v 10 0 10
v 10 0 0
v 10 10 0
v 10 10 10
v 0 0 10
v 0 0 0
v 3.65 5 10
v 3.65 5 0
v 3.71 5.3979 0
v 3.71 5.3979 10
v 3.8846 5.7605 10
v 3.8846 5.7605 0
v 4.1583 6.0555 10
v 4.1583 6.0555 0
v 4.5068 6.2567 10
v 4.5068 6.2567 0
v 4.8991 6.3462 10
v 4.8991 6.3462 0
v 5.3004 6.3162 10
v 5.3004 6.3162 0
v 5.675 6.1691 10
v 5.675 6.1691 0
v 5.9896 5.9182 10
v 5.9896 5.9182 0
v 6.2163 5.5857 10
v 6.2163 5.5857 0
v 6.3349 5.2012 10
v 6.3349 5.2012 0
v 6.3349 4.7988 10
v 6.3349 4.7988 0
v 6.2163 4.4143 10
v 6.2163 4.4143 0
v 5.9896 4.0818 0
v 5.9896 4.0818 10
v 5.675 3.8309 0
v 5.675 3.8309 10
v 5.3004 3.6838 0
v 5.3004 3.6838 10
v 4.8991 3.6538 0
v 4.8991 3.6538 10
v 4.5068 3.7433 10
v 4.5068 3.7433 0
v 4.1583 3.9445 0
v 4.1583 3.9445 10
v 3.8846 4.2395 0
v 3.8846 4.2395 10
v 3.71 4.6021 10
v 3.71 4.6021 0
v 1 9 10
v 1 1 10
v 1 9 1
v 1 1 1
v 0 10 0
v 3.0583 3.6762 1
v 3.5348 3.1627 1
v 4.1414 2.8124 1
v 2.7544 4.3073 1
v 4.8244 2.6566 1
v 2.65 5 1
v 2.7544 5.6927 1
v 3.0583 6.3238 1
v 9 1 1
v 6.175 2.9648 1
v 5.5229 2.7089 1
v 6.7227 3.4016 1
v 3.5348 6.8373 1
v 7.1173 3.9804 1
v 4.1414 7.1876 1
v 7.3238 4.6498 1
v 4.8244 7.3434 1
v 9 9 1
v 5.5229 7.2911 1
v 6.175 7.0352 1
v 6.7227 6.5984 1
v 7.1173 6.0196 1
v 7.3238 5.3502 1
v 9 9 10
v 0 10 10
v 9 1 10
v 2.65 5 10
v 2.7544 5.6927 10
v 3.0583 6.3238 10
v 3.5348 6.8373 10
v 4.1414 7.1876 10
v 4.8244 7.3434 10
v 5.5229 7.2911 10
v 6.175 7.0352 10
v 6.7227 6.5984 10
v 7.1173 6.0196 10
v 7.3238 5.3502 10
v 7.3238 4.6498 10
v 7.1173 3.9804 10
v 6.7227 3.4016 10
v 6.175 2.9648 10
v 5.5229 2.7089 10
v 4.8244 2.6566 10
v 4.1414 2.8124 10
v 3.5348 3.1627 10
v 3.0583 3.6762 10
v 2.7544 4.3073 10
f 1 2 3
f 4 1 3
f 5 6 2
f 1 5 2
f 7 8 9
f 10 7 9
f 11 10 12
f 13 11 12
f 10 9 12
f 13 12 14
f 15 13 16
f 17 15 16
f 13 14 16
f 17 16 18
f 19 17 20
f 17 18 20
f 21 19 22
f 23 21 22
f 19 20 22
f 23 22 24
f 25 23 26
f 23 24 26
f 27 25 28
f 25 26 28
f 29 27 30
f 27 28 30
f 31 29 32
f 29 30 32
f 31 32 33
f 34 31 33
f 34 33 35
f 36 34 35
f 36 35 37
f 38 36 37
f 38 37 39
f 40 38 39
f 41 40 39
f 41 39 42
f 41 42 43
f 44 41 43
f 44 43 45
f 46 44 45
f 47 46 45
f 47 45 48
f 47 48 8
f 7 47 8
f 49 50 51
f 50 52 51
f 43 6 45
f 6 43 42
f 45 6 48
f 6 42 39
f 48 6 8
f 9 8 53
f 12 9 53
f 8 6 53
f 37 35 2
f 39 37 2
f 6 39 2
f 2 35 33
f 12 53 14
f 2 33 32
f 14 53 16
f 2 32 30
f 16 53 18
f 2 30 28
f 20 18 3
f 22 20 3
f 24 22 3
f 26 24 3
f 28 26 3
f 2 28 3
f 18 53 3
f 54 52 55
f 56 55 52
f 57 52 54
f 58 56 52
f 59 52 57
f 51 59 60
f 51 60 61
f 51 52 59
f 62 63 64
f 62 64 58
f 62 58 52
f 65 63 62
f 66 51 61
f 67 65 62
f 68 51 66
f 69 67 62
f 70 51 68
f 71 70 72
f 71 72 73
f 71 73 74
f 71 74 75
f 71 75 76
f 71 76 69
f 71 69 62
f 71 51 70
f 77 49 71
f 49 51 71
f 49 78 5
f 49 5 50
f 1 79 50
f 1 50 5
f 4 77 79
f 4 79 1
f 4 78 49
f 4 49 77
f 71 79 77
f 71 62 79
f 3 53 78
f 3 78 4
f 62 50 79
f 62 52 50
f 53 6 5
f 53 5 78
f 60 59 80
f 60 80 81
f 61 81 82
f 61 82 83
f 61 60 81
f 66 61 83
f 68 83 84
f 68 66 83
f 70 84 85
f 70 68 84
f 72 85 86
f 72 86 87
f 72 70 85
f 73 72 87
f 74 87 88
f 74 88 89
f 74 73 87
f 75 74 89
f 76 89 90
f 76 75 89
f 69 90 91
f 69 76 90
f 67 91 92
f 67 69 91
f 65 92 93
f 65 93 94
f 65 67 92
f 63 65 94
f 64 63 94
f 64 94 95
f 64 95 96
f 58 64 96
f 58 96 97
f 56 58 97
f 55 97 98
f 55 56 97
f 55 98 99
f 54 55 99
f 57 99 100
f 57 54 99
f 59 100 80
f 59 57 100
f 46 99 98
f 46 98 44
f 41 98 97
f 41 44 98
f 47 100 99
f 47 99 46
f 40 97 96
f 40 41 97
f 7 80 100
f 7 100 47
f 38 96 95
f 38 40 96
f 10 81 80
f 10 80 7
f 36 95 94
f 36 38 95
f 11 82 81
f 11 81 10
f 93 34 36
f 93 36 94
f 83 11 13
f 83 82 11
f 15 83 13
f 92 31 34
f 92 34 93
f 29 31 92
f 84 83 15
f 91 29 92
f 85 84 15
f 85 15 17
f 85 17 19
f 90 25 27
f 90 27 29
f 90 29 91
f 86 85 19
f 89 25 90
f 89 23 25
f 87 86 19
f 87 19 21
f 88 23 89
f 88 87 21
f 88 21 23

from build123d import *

# Parameters (mm, degrees)
F0_W     = 10
F0_H     = 10
F1_DEPTH = 10
F3_D     = 2.7
F4_T     = -1


with BuildPart() as f1:
    # F0 (on Top) → F1 (new body)
    with BuildSketch(Plane.XY):
        with Locations((5, 5)):
            Rectangle(F0_W, F0_H)
    extrude(amount=F1_DEPTH)

    # F3 (through all)
    with Locations(Plane.XY.offset(10)):
        with Locations((5, 5)):
            Hole(F3_D / 2)

    # F4
    f4_openings = [f1.faces().sort_by_distance(p)[0] for p in [
        (0.141421, 5, 10),
    ]]
    offset(amount=F4_T, openings=f4_openings)


solid = f1.part
